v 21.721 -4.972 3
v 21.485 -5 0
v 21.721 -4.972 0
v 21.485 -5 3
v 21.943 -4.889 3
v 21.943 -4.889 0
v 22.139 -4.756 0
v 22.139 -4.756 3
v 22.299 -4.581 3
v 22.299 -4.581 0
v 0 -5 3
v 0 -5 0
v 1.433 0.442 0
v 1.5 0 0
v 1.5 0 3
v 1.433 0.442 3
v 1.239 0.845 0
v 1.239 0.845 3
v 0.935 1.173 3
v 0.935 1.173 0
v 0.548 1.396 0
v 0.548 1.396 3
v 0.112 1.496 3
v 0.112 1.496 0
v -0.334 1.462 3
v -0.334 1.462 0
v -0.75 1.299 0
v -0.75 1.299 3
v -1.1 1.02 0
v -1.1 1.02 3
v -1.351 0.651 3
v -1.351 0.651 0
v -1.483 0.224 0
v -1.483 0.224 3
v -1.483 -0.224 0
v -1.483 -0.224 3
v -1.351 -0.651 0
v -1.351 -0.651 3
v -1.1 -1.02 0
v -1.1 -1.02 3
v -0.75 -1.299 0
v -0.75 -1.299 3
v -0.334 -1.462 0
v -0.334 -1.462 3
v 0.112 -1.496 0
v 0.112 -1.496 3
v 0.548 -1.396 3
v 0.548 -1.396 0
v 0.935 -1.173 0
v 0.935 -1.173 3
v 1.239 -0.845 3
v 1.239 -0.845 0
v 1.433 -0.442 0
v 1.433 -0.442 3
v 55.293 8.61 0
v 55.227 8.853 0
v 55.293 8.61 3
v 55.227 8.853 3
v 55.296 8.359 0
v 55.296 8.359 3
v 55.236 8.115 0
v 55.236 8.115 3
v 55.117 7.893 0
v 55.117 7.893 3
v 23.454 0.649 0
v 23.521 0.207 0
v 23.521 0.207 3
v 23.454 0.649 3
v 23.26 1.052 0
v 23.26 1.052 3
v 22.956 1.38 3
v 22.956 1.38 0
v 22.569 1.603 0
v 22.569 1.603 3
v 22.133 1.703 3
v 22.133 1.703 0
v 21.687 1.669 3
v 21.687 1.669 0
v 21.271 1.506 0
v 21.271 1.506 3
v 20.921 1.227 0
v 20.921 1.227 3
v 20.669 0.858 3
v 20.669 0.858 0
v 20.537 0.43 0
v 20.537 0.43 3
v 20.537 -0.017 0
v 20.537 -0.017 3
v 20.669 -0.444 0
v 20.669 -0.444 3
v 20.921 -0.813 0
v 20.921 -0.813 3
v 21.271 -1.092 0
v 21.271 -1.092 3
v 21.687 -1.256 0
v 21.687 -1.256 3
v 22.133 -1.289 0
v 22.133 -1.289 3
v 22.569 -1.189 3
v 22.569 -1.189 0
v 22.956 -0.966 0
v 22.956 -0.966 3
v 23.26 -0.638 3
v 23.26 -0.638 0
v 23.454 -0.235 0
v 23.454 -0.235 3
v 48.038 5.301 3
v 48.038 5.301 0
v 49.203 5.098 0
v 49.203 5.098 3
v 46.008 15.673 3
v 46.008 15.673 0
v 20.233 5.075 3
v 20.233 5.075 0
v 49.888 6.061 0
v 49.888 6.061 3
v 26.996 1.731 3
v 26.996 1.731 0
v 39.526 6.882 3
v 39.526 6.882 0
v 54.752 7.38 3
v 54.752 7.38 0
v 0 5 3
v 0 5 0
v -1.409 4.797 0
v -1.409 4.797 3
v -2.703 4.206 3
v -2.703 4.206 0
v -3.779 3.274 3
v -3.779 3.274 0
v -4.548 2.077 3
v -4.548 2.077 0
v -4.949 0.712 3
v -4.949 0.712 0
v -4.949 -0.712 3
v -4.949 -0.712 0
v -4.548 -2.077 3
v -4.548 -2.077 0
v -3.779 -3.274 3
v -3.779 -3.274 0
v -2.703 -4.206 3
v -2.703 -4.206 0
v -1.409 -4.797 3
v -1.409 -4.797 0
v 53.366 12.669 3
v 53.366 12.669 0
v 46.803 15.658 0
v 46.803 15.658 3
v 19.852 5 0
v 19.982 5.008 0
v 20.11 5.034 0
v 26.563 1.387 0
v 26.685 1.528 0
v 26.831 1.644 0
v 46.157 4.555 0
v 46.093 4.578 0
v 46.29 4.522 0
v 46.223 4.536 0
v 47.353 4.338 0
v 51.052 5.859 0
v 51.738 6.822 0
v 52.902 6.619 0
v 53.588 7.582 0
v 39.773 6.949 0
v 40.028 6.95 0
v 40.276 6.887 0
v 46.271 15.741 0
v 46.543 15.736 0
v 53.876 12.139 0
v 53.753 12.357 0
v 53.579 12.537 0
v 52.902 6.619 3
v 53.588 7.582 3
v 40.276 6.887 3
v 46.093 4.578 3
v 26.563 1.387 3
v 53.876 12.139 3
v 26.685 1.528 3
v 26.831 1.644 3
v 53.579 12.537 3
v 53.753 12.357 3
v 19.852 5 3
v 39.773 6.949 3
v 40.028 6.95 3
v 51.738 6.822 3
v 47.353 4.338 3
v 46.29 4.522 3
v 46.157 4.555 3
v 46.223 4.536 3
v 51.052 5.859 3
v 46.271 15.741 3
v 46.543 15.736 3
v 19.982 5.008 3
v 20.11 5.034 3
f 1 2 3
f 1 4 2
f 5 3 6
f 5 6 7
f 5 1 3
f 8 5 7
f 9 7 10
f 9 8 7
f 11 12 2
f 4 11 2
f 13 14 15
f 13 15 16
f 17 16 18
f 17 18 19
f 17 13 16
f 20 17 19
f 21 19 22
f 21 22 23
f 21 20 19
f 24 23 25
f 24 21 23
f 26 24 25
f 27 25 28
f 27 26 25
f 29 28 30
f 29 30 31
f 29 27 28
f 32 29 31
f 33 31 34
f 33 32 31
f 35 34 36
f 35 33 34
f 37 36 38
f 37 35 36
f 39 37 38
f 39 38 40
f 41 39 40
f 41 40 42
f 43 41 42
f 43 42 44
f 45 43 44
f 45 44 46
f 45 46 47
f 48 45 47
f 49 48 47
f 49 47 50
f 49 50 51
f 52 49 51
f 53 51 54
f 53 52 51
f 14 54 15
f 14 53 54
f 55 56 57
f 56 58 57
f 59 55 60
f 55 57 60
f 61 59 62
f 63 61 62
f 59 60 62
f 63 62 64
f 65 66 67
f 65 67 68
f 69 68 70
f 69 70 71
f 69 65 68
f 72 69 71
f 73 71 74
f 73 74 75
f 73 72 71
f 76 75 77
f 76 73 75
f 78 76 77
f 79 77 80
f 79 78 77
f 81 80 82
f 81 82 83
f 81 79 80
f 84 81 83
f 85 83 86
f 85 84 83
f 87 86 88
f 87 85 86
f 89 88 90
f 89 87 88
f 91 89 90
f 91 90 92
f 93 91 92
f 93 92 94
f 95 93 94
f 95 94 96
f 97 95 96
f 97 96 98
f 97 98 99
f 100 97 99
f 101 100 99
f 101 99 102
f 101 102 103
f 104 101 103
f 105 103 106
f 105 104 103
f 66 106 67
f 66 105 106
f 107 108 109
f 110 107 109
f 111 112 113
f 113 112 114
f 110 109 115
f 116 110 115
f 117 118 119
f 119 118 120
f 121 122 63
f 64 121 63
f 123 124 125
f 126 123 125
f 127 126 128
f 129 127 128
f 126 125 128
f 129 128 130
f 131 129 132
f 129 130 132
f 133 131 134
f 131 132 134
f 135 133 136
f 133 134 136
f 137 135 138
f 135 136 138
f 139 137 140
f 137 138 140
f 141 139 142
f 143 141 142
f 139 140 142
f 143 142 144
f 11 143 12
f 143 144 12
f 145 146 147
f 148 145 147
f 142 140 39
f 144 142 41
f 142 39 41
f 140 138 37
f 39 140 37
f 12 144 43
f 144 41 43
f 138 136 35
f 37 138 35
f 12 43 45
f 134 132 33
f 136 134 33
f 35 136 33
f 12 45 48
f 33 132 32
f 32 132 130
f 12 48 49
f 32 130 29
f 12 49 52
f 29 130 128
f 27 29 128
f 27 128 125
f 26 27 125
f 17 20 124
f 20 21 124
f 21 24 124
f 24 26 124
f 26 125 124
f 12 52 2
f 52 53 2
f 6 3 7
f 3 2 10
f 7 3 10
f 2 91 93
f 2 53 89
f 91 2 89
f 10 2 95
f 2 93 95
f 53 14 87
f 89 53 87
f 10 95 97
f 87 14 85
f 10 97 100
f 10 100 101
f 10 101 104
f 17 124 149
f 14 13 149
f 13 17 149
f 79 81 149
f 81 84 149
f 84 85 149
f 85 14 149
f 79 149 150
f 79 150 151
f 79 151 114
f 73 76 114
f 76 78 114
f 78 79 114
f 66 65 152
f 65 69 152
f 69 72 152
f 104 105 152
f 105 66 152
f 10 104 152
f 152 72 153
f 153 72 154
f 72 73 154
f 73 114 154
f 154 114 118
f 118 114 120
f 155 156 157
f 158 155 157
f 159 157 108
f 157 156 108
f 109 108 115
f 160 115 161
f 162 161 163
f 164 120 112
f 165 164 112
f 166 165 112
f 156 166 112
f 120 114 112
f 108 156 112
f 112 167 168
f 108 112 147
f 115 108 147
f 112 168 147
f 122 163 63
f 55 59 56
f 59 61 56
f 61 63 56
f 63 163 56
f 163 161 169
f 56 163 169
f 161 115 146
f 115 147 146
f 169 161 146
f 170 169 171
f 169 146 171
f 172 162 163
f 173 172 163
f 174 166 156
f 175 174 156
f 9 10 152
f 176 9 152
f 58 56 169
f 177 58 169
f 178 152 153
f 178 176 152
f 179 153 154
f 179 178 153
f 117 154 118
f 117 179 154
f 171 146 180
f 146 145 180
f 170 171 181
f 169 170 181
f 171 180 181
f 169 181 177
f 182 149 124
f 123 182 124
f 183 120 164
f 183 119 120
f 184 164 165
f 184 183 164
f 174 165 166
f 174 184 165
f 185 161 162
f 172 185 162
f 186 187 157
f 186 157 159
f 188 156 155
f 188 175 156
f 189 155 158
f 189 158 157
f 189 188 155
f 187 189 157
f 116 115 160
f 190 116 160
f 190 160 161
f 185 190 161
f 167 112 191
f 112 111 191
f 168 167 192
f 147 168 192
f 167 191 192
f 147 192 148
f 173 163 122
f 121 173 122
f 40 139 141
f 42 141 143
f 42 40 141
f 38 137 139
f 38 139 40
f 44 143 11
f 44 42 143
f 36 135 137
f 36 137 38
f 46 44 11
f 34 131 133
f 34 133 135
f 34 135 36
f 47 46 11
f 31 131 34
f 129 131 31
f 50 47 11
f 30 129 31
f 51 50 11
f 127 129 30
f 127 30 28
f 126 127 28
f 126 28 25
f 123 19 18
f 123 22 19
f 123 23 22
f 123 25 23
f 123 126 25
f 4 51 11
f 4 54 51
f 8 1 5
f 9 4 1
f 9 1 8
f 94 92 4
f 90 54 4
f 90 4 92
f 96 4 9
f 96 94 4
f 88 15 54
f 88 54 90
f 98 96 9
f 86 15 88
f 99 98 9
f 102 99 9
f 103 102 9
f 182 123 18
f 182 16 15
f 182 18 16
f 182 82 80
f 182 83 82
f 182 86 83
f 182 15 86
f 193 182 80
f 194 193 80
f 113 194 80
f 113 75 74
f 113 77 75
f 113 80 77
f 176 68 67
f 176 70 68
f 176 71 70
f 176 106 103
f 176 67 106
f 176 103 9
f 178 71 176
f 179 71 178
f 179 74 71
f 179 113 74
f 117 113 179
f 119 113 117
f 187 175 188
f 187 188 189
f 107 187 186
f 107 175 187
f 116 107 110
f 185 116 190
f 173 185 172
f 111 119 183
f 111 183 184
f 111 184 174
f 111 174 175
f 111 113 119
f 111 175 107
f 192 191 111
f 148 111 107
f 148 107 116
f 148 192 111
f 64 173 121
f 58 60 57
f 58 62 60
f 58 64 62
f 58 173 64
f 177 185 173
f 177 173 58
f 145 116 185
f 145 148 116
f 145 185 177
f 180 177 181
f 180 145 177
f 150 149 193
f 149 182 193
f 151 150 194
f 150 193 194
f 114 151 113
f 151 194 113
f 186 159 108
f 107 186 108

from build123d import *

# Parameters (mm, degrees)
SKETCH1_R           = 1.5
BOSS_EXTRUDE3_DEPTH = 3
FILLET1_R           = 1


with BuildPart() as part:
    # Sketch1 → Boss-Extrude3 (new body)
    with BuildSketch(Plane.XY):
        with BuildLine():
            Line((20.05, 5), (0, 5))
            ThreePointArc((0, 5), (-5, 0), (0, -5))
            Line((0, -5), (22, -5))
            Line((22, -5), (26.72989842, 1.621129525))
            Line((26.72989842, 1.621129525), (39.900164389, 7.036080522))
            Line((39.900164389, 7.036080522), (46.188488025, 4.540007042))
            Line((46.188488025, 4.540007042), (47.352932204, 4.337597171))
            Line((47.352932204, 4.337597171), (48.038244482, 5.300533868))
            Line((48.038244482, 5.300533868), (49.20268866, 5.098123997))
            Line((49.20268866, 5.098123997), (49.888000938, 6.061060693))
            Line((49.888000938, 6.061060693), (51.052445116, 5.858650822))
            Line((51.052445116, 5.858650822), (51.737757394, 6.821587519))
            Line((51.737757394, 6.821587519), (52.902201573, 6.619177648))
            Line((52.902201573, 6.619177648), (53.587513851, 7.582114344))
            Line((53.587513851, 7.582114344), (54.751958029, 7.379704473))
            Line((54.751958029, 7.379704473), (55.437270307, 8.34264117))
            Line((55.437270307, 8.34264117), (53.72608495, 12.504593197))
            Line((53.72608495, 12.504593197), (46.409029503, 15.837507263))
            Line((46.409029503, 15.837507263), (20.05, 5))
        make_face()
        Circle(SKETCH1_R, mode=Mode.SUBTRACT)
        with Locations((22.020705275, 0.206842568)):
            Circle(SKETCH1_R, mode=Mode.SUBTRACT)
    extrude(amount=BOSS_EXTRUDE3_DEPTH)

    # Fillet1
    fillet1_edges = [part.edges().sort_by_distance(p)[0] for p in [
        (22, -5, 1.5),
        (20.05, 5, 1.5),
        (46.409029503, 15.837507263, 1.5),
        (53.72608495, 12.504593197, 1.5),
        (55.437270307, 8.34264117, 1.5),
        (46.188488025, 4.540007042, 1.5),
        (39.900164389, 7.036080522, 1.5),
        (26.72989842, 1.621129525, 1.5),
    ]]
    fillet(fillet1_edges, radius=FILLET1_R)


solid = part.part
